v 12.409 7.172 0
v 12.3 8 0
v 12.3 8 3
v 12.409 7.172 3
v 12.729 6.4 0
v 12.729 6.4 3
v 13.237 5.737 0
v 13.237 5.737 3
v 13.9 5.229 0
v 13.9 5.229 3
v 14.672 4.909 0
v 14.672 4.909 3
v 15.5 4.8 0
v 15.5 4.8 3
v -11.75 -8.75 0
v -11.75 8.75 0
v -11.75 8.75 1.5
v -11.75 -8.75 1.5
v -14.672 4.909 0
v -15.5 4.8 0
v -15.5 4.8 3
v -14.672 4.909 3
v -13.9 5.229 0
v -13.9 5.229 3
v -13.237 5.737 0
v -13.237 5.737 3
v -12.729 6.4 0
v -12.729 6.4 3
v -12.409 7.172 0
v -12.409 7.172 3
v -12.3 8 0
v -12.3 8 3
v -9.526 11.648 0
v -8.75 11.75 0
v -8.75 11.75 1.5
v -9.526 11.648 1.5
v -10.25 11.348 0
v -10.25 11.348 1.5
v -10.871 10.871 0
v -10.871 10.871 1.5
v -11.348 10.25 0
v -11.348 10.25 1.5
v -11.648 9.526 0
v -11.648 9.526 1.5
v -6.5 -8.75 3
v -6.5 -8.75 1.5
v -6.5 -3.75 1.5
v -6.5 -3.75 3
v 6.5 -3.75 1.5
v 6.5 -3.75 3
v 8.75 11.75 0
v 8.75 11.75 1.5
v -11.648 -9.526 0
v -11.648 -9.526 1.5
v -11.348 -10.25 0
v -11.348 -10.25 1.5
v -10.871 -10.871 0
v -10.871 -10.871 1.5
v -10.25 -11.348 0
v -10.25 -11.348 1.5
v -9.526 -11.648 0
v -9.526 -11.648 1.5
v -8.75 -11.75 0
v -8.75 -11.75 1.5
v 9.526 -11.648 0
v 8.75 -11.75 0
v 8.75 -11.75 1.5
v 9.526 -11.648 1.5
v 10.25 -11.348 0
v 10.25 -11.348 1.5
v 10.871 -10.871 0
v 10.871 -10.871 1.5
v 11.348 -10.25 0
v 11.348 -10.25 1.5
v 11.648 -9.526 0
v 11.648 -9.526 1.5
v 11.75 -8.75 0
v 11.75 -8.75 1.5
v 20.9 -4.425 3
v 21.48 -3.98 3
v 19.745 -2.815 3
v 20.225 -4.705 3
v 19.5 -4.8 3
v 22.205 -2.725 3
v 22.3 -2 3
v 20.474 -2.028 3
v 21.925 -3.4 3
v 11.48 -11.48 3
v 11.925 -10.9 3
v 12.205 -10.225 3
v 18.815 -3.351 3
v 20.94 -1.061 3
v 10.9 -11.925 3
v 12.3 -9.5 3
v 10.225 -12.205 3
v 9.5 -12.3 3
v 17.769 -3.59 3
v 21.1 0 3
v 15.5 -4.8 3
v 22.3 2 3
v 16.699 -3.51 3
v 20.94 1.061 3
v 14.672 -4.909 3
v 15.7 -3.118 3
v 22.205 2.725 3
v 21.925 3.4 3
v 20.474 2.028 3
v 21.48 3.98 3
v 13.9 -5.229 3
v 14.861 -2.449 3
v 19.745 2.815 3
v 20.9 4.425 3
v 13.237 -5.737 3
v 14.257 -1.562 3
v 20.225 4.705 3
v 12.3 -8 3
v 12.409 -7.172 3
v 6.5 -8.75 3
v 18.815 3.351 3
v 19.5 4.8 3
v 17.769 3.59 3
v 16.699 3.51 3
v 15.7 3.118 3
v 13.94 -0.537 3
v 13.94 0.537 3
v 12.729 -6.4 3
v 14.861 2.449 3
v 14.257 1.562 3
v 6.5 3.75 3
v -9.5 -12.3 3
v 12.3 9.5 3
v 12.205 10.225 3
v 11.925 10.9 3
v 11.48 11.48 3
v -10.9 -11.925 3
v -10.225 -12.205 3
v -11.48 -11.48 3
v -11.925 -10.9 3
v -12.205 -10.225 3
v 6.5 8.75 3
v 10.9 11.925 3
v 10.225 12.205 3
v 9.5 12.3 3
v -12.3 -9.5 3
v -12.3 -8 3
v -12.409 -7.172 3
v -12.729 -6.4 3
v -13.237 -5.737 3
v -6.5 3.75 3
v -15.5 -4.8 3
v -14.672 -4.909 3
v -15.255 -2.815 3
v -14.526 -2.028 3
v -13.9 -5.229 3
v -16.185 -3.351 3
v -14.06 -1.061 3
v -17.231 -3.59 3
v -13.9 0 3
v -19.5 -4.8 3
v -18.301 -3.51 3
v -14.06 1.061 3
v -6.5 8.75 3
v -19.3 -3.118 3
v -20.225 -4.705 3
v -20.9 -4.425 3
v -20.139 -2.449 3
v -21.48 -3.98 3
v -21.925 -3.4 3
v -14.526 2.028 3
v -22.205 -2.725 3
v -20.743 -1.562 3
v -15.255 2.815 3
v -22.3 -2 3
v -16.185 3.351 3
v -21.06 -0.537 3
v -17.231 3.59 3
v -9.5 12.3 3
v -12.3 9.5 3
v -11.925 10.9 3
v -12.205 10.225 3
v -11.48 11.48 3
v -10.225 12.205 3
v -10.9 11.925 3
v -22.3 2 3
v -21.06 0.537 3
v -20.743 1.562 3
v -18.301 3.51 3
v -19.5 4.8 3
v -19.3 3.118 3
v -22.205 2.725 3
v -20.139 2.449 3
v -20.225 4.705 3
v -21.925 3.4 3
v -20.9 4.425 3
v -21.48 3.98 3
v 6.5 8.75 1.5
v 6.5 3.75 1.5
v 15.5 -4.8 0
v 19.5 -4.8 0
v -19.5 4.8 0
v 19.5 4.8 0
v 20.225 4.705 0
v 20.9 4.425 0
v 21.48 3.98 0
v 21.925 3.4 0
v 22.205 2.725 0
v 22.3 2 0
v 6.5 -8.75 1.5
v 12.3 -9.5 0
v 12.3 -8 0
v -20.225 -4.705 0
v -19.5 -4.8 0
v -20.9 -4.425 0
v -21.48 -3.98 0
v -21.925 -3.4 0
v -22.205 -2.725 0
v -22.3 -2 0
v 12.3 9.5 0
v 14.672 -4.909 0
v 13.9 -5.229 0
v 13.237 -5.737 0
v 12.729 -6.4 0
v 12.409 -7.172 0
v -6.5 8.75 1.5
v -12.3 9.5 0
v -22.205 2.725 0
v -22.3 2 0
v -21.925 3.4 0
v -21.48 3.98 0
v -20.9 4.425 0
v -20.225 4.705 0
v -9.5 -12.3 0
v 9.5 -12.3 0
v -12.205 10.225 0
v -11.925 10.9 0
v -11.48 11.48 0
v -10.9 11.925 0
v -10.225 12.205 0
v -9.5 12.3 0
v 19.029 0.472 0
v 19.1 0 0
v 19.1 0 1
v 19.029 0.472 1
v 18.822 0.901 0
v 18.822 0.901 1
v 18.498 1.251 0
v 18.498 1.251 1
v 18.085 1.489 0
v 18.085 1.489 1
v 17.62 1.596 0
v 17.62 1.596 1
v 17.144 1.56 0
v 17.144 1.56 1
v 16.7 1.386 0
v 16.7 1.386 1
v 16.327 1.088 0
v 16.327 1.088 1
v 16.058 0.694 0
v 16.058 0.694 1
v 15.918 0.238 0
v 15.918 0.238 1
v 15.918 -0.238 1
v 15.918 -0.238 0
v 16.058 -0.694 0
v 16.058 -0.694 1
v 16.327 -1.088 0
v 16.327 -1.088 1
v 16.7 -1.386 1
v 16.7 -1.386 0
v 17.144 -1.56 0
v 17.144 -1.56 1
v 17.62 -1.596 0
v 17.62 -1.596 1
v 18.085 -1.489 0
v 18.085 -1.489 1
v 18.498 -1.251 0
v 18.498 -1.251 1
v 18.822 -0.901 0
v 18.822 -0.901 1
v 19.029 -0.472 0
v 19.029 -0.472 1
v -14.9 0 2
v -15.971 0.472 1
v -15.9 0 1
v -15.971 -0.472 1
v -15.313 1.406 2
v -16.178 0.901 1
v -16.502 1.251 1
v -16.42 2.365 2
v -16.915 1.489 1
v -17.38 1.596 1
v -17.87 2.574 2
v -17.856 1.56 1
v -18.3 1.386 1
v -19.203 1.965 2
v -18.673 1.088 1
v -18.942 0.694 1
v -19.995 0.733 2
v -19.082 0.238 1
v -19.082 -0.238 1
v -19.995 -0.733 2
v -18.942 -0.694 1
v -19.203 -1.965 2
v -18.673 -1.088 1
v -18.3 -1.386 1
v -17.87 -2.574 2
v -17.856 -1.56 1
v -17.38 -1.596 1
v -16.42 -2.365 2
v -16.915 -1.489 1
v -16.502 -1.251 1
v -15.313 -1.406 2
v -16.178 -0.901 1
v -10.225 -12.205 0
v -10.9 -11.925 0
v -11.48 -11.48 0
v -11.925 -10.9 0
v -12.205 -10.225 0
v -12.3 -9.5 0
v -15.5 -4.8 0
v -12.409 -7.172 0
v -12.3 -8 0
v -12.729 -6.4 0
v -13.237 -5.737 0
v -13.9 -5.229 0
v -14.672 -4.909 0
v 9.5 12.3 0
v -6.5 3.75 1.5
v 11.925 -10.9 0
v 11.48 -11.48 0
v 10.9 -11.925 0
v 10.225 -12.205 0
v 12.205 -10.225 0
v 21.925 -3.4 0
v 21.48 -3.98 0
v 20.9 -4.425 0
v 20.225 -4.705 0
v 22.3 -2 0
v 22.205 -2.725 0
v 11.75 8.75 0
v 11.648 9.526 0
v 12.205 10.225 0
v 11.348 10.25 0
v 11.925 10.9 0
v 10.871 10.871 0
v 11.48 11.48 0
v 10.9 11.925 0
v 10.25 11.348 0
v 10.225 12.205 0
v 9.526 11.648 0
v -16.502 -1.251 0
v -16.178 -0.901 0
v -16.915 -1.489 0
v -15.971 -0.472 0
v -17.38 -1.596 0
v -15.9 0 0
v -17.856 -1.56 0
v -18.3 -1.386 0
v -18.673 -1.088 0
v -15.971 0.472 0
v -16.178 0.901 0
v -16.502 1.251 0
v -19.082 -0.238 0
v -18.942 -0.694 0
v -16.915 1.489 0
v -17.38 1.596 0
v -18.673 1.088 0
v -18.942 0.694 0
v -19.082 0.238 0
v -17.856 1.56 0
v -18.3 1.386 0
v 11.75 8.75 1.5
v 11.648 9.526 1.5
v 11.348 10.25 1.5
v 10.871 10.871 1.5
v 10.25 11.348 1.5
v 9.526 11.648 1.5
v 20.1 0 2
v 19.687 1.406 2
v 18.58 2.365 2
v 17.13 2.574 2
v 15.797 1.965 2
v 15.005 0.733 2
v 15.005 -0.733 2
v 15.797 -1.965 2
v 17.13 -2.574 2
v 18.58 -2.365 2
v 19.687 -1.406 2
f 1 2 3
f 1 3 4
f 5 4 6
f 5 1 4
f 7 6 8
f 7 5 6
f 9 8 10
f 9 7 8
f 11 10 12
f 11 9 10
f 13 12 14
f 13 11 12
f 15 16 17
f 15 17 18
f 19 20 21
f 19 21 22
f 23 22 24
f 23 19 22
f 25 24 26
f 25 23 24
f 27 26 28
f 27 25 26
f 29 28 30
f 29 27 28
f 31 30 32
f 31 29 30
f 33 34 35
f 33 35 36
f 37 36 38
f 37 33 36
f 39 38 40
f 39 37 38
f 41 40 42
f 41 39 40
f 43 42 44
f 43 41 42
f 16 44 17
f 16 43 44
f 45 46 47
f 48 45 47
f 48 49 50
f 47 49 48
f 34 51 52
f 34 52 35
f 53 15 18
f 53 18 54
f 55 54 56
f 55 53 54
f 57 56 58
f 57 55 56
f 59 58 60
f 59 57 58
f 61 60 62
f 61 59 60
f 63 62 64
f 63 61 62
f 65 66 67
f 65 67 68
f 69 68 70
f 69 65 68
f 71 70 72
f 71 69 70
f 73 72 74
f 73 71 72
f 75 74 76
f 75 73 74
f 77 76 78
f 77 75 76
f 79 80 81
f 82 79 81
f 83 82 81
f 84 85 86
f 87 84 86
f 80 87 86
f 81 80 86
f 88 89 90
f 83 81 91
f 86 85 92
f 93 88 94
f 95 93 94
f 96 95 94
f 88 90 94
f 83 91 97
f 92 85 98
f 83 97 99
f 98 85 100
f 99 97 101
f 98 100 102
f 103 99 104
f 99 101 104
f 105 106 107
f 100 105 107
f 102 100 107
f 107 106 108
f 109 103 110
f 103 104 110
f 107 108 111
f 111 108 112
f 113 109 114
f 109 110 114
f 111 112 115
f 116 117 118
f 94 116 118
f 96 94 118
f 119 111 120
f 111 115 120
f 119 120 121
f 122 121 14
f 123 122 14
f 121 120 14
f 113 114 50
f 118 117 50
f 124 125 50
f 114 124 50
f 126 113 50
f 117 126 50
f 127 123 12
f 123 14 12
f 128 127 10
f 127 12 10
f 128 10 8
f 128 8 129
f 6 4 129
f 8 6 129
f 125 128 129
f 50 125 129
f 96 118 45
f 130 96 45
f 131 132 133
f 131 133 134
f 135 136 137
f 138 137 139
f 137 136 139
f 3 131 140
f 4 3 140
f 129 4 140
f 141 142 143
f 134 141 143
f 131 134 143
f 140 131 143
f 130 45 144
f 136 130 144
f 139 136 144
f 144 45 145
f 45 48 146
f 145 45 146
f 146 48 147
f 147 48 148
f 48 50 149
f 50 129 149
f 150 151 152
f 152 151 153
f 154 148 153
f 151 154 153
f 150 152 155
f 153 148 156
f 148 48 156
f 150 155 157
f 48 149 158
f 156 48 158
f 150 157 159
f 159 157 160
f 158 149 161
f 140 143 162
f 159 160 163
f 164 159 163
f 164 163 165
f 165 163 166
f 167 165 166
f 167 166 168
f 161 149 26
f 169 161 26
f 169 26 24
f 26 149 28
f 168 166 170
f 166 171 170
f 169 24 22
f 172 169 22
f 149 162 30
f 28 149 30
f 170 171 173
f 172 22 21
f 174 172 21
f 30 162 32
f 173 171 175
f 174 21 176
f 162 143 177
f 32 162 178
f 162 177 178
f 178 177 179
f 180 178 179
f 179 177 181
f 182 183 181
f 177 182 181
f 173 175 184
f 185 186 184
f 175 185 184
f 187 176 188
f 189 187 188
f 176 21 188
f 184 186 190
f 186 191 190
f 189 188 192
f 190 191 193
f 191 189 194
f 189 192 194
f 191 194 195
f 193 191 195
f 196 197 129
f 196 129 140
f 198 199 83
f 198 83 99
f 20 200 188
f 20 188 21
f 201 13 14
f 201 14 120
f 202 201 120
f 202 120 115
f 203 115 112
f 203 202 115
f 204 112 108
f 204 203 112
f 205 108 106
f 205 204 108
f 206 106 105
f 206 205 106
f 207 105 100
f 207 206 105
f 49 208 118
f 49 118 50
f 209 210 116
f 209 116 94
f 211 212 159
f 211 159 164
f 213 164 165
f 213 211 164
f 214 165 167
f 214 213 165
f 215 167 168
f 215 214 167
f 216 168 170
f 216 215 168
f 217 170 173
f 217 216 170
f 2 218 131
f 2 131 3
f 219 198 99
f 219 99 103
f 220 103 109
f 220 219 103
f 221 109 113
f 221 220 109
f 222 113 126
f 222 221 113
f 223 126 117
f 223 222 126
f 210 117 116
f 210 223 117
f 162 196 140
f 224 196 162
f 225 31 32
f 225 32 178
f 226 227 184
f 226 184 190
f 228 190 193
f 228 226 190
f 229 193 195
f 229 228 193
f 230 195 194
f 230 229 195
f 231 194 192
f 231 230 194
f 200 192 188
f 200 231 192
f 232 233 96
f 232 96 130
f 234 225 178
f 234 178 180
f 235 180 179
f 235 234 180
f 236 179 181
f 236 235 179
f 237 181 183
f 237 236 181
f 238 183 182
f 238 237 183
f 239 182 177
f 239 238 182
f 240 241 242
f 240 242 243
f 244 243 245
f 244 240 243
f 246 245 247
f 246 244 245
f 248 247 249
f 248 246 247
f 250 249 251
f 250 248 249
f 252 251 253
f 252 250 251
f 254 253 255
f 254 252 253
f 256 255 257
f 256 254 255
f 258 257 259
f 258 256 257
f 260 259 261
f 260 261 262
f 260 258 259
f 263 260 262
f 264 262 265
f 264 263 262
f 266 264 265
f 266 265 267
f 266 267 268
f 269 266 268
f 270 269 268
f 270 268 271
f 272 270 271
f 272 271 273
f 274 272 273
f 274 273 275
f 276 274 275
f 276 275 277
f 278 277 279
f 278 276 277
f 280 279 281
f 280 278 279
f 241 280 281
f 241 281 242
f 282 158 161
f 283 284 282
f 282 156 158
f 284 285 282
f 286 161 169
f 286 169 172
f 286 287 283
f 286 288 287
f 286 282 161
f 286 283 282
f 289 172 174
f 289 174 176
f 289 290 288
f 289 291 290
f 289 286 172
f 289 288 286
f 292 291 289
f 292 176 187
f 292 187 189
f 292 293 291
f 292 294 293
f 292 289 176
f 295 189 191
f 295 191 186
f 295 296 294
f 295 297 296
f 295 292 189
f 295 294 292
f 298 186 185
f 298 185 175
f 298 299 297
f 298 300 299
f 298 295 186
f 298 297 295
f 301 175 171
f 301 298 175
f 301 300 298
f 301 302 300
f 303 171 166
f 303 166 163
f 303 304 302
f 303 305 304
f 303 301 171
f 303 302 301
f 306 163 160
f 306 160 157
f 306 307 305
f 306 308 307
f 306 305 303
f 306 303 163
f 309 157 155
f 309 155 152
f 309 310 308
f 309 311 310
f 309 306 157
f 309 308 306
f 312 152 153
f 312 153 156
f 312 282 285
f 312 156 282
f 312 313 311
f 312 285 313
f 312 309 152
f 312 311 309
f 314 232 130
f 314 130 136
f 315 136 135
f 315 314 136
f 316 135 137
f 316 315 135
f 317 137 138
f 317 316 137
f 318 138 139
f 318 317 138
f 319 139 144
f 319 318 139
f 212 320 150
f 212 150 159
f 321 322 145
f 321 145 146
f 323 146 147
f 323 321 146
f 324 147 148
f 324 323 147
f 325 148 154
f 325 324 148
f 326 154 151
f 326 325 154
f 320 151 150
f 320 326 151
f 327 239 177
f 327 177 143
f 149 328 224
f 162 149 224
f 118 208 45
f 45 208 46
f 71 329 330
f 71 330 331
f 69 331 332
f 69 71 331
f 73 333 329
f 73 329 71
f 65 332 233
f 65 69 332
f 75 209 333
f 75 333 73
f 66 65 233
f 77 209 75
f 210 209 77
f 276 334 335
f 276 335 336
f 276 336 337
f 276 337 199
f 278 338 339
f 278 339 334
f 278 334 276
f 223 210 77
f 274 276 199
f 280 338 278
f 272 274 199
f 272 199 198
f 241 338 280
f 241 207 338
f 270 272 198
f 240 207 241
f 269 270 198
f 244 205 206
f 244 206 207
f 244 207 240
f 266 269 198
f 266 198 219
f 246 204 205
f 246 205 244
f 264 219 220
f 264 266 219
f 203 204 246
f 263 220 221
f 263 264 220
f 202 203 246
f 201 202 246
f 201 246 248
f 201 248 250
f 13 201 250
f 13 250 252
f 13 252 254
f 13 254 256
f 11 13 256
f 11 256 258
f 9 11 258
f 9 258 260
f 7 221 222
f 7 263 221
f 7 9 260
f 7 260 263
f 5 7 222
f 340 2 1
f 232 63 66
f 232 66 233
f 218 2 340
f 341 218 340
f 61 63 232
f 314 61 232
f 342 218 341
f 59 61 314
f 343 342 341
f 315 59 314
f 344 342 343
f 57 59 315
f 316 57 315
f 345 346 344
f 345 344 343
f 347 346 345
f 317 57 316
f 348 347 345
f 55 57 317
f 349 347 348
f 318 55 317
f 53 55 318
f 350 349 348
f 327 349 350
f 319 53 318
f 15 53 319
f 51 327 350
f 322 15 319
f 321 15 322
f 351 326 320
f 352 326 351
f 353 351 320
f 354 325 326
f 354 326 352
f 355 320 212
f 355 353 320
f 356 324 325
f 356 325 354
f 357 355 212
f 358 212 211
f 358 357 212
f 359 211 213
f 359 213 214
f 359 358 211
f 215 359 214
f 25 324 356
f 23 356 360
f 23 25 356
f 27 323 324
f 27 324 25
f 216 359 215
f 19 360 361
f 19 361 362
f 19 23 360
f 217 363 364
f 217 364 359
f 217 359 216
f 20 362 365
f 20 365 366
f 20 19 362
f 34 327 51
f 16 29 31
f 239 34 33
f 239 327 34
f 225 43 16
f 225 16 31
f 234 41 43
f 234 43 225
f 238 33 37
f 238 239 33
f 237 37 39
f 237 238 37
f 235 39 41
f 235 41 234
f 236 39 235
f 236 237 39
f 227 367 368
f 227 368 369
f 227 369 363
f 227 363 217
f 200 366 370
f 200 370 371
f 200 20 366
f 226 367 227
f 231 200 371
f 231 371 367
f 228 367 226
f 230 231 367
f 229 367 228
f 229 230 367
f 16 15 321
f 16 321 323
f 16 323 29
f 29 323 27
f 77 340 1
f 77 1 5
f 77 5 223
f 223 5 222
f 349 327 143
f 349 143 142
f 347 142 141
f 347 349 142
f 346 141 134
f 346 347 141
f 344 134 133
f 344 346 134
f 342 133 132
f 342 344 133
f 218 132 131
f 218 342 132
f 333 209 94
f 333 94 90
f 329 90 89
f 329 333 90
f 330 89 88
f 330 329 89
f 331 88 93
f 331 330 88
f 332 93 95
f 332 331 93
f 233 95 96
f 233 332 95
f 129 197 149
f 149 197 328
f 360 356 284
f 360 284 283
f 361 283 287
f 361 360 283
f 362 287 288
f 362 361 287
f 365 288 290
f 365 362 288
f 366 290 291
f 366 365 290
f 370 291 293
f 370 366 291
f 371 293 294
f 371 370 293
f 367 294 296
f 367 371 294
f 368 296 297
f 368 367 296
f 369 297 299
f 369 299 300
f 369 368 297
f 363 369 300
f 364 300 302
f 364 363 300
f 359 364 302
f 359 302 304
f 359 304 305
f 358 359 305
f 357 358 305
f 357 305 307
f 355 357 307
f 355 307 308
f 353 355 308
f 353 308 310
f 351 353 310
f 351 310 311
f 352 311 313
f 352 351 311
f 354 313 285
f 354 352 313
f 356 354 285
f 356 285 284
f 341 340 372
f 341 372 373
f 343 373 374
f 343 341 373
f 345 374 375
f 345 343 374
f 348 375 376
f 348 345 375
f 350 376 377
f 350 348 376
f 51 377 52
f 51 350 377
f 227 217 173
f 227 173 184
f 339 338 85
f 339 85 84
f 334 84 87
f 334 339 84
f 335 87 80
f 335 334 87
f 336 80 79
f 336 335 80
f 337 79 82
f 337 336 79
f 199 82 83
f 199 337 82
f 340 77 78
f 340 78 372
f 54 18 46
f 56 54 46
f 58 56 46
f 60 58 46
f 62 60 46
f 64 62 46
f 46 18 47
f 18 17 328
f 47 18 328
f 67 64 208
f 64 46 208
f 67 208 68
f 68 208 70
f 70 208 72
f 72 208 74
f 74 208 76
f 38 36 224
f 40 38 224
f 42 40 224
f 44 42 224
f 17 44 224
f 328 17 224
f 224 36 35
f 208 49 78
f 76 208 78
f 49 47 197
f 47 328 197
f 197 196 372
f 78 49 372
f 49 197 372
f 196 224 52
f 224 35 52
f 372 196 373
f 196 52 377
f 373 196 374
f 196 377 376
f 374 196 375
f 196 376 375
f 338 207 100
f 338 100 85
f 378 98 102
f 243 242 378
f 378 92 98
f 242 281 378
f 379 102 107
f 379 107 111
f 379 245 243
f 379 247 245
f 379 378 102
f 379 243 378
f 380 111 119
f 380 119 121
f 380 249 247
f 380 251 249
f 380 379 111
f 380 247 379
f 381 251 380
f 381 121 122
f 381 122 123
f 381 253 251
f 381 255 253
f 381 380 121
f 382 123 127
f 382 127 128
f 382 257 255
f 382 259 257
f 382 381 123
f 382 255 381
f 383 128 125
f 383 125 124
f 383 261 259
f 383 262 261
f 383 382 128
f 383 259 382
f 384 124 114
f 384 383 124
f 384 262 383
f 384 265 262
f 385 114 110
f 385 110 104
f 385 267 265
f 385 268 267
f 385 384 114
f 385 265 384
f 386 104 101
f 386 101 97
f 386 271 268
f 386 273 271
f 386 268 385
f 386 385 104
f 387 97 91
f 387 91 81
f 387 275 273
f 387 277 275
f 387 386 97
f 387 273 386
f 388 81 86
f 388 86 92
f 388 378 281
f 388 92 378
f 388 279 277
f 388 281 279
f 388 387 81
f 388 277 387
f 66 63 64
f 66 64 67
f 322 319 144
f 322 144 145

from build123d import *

# Parameters (mm, degrees)
ESQUISSE1_R             = 1.6
BOSS_EXTRU_1_DEPTH      = 3
ENL_V_MAT_EXTRU_1_DEPTH = 1.5
ESQUISSE4_W             = 13
ESQUISSE4_H             = 5
ENL_V_MAT_EXTRU_2_DEPTH = 26.511370014
CHANFREIN1_SIZE         = 2


with BuildPart() as part:
    # Esquisse1 → Boss.-Extru.1 (new body)
    with BuildSketch(Plane.XY):
        with BuildLine():
            Line((-9.5, 12.3), (9.5, 12.3))
            ThreePointArc((9.5, 12.3), (11.479898987, 11.479898987), (12.3, 9.5))
            Line((12.3, 9.5), (12.3, 8))
            ThreePointArc((12.3, 8), (13.2372583, 5.7372583), (15.5, 4.8))
            Line((15.5, 4.8), (19.5, 4.8))
            ThreePointArc((19.5, 4.8), (21.479898987, 3.979898987), (22.3, 2))
            Line((22.3, 2), (22.3, -2))
            ThreePointArc((22.3, -2), (21.479898987, -3.979898987), (19.5, -4.8))
            Line((19.5, -4.8), (15.5, -4.8))
            ThreePointArc((15.5, -4.8), (13.2372583, -5.7372583), (12.3, -8))
            Line((12.3, -8), (12.3, -9.5))
            ThreePointArc((12.3, -9.5), (11.479898987, -11.479898987), (9.5, -12.3))
            Line((9.5, -12.3), (-9.5, -12.3))
            ThreePointArc((-9.5, -12.3), (-11.479898987, -11.479898987), (-12.3, -9.5))
            Line((-12.3, -9.5), (-12.3, -8))
            ThreePointArc((-12.3, -8), (-13.2372583, -5.7372583), (-15.5, -4.8))
            Line((-15.5, -4.8), (-19.5, -4.8))
            ThreePointArc((-19.5, -4.8), (-21.479898987, -3.979898987), (-22.3, -2))
            Line((-22.3, -2), (-22.3, 2))
            ThreePointArc((-22.3, 2), (-21.479898987, 3.979898987), (-19.5, 4.8))
            Line((-19.5, 4.8), (-15.5, 4.8))
            ThreePointArc((-15.5, 4.8), (-13.2372583, 5.7372583), (-12.3, 8))
            Line((-12.3, 8), (-12.3, 9.5))
            ThreePointArc((-12.3, 9.5), (-11.479898987, 11.479898987), (-9.5, 12.3))
        make_face()
        with Locations((-17.5, 0)):
            Circle(ESQUISSE1_R, mode=Mode.SUBTRACT)
        with Locations((17.5, 0)):
            Circle(ESQUISSE1_R, mode=Mode.SUBTRACT)
    extrude(amount=BOSS_EXTRU_1_DEPTH)

    # Esquisse2 → Enlèv. mat.-Extru.1 (cut)
    with BuildSketch(Plane(origin=(0, 0, 0), x_dir=(-1, 0, 0), z_dir=(0, 0, -1))):
        with BuildLine():
            Line((-8.75, 11.75), (8.75, 11.75))
            ThreePointArc((8.75, 11.75), (10.871320344, 10.871320344), (11.75, 8.75))
            Line((11.75, 8.75), (11.75, -8.75))
            ThreePointArc((11.75, -8.75), (10.871320344, -10.871320344), (8.75, -11.75))
            Line((8.75, -11.75), (-8.75, -11.75))
            ThreePointArc((-8.75, -11.75), (-10.871320344, -10.871320344), (-11.75, -8.75))
            Line((-11.75, -8.75), (-11.75, 8.75))
            ThreePointArc((-11.75, 8.75), (-10.871320344, 10.871320344), (-8.75, 11.75))
        make_face()
    extrude(amount=-ENL_V_MAT_EXTRU_1_DEPTH, mode=Mode.SUBTRACT)

    # Esquisse4 → Enlèv. mat.-Extru.2 (cut, through all)
    with BuildSketch(Plane(origin=(0, 0, 1.5), x_dir=(-1, 0, 0), z_dir=(0, 0, -1))):
        with Locations((0, 6.25)):
            Rectangle(ESQUISSE4_W, ESQUISSE4_H)
        with Locations((0, -6.25)):
            Rectangle(ESQUISSE4_W, ESQUISSE4_H)
    extrude(amount=-ENL_V_MAT_EXTRU_2_DEPTH, mode=Mode.SUBTRACT)

    # Chanfrein1
    chanfrein1_edges = [part.edges().sort_by_distance(p)[0] for p in [
        (-19.1, 0, 3),
        (15.9, 0, 3),
    ]]
    chamfer(chanfrein1_edges, length=CHANFREIN1_SIZE)


solid = part.part
